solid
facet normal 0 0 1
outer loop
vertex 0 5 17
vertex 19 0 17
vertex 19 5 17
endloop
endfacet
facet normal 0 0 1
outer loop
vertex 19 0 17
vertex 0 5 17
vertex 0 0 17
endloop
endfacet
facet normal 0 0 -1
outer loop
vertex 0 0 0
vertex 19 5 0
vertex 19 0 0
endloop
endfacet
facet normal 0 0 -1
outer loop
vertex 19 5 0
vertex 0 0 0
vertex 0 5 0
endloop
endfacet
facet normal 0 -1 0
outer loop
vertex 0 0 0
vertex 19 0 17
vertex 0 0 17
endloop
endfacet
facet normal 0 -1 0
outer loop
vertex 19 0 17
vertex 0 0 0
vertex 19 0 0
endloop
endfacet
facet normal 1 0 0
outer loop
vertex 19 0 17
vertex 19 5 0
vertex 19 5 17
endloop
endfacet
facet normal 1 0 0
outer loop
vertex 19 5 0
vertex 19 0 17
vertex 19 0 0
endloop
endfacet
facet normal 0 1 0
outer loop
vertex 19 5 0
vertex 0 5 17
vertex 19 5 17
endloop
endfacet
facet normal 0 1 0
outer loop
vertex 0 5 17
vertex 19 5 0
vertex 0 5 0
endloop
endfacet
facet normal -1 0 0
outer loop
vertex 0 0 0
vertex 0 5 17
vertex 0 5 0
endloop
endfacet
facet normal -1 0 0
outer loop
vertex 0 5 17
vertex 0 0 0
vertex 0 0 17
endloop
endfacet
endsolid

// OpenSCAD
// Generated by SolidPython 1.0.1 on 2020-07-29 00:46:56


cube(size = [19, 5, 17]);
/***********************************************
*********      SolidPython code:      **********
************************************************
 
# import packages: SolidPython
from solid import *
from solid.utils import *
from itertools import chain, combinations, permutations


class Resize:

    def __init__(self, scad_file):
        self.scad_file = scad_file
        #self.scad_file = import_scad(scad_file)
        # cone/cylinder param:
        self.r1 = 0
        self.r2 = 0
        self.h = 0
        # rectangular prism param:
        self.w = 0
        self.l = 0
        # ellipse param:
        self.r = 0

    # import OpenScad code (file name corresponds to shape)


    # classify shape + parameters
    def assign(self, param1, param2, param3):
        if self.scad_file == 'cone.scad':
            self.r1 = param1
            self.r2 = param2
            self.h = param3
        elif self.scad_file == 'cylinder.scad':
            self.r1 = param1
            self.r2 = param2
            self.h = param3
        elif self.scad_file == 'rectangularPrism.scad':
            self.h = param1
            self.l = param2
            self.w = param3
        else:
            self.r = param1
            self.h = param2

    # resize parameters
    def iterate(self):
        x = range(3, 20, 2)
        i = 1
        if self.scad_file == 'cone.scad':
            tempList = list(permutations(x, 2))
            for temp in tempList:
                param1 = temp[0]
                param2 = temp[1]
                filepath = 'produced_scad_files/' + 'cone' + str(param1) + '_' + str(param2) + '_' + '.scad'
                scad_render_to_file(cylinder(h=param1, r1=param2, r2=0), filepath)

        elif self.scad_file == 'cylinder.scad':
            tempList = list(permutations(x, 3))
            for temp in tempList:
                param1 = temp[0]
                param2 = temp[1]
                filepath = 'produced_scad_files/' + 'cylinder' + str(param1) + '_' + str(param2) + '_' + '.scad'
                scad_render_to_file(cylinder(h=param1, r1=param2, r2=param2), filepath)

        elif self.scad_file == 'rectangularPrism.scad':
            tempList = list(permutations(x, 3))
            for temp in tempList:
                param1 = temp[0]
                param2 = temp[1]
                param3 = temp[2]
                filepath = 'produced_scad_files/' + 'rectangularPrism' + str(param1) + '_' + str(param2) + '_' + str(
                    param3) + '.scad'
                scad_render_to_file(cube(size=(param1, param2, param3)), filepath)

        elif self.scad_file == 'ellipse.scad':
            tempList = list(permutations(x, 4))
            for temp in tempList:
                param1 = temp[0]
                param2 = temp[1]
                param3 = temp[2]
                param4 = temp[3]
                filepath = 'produced_scad_files/' + 'ellipse' + str(param1) + '_' + str(param2) + '_' + str(param3) + '_' + str(param4) + '.scad'
                scad_render_to_file(scale([param1, param2, param3])(sphere(r=param4)), filepath)

    def render_to_scadfile(self):
        scad_render_to_file(scad, 'example.scad') 
 
************************************************/
